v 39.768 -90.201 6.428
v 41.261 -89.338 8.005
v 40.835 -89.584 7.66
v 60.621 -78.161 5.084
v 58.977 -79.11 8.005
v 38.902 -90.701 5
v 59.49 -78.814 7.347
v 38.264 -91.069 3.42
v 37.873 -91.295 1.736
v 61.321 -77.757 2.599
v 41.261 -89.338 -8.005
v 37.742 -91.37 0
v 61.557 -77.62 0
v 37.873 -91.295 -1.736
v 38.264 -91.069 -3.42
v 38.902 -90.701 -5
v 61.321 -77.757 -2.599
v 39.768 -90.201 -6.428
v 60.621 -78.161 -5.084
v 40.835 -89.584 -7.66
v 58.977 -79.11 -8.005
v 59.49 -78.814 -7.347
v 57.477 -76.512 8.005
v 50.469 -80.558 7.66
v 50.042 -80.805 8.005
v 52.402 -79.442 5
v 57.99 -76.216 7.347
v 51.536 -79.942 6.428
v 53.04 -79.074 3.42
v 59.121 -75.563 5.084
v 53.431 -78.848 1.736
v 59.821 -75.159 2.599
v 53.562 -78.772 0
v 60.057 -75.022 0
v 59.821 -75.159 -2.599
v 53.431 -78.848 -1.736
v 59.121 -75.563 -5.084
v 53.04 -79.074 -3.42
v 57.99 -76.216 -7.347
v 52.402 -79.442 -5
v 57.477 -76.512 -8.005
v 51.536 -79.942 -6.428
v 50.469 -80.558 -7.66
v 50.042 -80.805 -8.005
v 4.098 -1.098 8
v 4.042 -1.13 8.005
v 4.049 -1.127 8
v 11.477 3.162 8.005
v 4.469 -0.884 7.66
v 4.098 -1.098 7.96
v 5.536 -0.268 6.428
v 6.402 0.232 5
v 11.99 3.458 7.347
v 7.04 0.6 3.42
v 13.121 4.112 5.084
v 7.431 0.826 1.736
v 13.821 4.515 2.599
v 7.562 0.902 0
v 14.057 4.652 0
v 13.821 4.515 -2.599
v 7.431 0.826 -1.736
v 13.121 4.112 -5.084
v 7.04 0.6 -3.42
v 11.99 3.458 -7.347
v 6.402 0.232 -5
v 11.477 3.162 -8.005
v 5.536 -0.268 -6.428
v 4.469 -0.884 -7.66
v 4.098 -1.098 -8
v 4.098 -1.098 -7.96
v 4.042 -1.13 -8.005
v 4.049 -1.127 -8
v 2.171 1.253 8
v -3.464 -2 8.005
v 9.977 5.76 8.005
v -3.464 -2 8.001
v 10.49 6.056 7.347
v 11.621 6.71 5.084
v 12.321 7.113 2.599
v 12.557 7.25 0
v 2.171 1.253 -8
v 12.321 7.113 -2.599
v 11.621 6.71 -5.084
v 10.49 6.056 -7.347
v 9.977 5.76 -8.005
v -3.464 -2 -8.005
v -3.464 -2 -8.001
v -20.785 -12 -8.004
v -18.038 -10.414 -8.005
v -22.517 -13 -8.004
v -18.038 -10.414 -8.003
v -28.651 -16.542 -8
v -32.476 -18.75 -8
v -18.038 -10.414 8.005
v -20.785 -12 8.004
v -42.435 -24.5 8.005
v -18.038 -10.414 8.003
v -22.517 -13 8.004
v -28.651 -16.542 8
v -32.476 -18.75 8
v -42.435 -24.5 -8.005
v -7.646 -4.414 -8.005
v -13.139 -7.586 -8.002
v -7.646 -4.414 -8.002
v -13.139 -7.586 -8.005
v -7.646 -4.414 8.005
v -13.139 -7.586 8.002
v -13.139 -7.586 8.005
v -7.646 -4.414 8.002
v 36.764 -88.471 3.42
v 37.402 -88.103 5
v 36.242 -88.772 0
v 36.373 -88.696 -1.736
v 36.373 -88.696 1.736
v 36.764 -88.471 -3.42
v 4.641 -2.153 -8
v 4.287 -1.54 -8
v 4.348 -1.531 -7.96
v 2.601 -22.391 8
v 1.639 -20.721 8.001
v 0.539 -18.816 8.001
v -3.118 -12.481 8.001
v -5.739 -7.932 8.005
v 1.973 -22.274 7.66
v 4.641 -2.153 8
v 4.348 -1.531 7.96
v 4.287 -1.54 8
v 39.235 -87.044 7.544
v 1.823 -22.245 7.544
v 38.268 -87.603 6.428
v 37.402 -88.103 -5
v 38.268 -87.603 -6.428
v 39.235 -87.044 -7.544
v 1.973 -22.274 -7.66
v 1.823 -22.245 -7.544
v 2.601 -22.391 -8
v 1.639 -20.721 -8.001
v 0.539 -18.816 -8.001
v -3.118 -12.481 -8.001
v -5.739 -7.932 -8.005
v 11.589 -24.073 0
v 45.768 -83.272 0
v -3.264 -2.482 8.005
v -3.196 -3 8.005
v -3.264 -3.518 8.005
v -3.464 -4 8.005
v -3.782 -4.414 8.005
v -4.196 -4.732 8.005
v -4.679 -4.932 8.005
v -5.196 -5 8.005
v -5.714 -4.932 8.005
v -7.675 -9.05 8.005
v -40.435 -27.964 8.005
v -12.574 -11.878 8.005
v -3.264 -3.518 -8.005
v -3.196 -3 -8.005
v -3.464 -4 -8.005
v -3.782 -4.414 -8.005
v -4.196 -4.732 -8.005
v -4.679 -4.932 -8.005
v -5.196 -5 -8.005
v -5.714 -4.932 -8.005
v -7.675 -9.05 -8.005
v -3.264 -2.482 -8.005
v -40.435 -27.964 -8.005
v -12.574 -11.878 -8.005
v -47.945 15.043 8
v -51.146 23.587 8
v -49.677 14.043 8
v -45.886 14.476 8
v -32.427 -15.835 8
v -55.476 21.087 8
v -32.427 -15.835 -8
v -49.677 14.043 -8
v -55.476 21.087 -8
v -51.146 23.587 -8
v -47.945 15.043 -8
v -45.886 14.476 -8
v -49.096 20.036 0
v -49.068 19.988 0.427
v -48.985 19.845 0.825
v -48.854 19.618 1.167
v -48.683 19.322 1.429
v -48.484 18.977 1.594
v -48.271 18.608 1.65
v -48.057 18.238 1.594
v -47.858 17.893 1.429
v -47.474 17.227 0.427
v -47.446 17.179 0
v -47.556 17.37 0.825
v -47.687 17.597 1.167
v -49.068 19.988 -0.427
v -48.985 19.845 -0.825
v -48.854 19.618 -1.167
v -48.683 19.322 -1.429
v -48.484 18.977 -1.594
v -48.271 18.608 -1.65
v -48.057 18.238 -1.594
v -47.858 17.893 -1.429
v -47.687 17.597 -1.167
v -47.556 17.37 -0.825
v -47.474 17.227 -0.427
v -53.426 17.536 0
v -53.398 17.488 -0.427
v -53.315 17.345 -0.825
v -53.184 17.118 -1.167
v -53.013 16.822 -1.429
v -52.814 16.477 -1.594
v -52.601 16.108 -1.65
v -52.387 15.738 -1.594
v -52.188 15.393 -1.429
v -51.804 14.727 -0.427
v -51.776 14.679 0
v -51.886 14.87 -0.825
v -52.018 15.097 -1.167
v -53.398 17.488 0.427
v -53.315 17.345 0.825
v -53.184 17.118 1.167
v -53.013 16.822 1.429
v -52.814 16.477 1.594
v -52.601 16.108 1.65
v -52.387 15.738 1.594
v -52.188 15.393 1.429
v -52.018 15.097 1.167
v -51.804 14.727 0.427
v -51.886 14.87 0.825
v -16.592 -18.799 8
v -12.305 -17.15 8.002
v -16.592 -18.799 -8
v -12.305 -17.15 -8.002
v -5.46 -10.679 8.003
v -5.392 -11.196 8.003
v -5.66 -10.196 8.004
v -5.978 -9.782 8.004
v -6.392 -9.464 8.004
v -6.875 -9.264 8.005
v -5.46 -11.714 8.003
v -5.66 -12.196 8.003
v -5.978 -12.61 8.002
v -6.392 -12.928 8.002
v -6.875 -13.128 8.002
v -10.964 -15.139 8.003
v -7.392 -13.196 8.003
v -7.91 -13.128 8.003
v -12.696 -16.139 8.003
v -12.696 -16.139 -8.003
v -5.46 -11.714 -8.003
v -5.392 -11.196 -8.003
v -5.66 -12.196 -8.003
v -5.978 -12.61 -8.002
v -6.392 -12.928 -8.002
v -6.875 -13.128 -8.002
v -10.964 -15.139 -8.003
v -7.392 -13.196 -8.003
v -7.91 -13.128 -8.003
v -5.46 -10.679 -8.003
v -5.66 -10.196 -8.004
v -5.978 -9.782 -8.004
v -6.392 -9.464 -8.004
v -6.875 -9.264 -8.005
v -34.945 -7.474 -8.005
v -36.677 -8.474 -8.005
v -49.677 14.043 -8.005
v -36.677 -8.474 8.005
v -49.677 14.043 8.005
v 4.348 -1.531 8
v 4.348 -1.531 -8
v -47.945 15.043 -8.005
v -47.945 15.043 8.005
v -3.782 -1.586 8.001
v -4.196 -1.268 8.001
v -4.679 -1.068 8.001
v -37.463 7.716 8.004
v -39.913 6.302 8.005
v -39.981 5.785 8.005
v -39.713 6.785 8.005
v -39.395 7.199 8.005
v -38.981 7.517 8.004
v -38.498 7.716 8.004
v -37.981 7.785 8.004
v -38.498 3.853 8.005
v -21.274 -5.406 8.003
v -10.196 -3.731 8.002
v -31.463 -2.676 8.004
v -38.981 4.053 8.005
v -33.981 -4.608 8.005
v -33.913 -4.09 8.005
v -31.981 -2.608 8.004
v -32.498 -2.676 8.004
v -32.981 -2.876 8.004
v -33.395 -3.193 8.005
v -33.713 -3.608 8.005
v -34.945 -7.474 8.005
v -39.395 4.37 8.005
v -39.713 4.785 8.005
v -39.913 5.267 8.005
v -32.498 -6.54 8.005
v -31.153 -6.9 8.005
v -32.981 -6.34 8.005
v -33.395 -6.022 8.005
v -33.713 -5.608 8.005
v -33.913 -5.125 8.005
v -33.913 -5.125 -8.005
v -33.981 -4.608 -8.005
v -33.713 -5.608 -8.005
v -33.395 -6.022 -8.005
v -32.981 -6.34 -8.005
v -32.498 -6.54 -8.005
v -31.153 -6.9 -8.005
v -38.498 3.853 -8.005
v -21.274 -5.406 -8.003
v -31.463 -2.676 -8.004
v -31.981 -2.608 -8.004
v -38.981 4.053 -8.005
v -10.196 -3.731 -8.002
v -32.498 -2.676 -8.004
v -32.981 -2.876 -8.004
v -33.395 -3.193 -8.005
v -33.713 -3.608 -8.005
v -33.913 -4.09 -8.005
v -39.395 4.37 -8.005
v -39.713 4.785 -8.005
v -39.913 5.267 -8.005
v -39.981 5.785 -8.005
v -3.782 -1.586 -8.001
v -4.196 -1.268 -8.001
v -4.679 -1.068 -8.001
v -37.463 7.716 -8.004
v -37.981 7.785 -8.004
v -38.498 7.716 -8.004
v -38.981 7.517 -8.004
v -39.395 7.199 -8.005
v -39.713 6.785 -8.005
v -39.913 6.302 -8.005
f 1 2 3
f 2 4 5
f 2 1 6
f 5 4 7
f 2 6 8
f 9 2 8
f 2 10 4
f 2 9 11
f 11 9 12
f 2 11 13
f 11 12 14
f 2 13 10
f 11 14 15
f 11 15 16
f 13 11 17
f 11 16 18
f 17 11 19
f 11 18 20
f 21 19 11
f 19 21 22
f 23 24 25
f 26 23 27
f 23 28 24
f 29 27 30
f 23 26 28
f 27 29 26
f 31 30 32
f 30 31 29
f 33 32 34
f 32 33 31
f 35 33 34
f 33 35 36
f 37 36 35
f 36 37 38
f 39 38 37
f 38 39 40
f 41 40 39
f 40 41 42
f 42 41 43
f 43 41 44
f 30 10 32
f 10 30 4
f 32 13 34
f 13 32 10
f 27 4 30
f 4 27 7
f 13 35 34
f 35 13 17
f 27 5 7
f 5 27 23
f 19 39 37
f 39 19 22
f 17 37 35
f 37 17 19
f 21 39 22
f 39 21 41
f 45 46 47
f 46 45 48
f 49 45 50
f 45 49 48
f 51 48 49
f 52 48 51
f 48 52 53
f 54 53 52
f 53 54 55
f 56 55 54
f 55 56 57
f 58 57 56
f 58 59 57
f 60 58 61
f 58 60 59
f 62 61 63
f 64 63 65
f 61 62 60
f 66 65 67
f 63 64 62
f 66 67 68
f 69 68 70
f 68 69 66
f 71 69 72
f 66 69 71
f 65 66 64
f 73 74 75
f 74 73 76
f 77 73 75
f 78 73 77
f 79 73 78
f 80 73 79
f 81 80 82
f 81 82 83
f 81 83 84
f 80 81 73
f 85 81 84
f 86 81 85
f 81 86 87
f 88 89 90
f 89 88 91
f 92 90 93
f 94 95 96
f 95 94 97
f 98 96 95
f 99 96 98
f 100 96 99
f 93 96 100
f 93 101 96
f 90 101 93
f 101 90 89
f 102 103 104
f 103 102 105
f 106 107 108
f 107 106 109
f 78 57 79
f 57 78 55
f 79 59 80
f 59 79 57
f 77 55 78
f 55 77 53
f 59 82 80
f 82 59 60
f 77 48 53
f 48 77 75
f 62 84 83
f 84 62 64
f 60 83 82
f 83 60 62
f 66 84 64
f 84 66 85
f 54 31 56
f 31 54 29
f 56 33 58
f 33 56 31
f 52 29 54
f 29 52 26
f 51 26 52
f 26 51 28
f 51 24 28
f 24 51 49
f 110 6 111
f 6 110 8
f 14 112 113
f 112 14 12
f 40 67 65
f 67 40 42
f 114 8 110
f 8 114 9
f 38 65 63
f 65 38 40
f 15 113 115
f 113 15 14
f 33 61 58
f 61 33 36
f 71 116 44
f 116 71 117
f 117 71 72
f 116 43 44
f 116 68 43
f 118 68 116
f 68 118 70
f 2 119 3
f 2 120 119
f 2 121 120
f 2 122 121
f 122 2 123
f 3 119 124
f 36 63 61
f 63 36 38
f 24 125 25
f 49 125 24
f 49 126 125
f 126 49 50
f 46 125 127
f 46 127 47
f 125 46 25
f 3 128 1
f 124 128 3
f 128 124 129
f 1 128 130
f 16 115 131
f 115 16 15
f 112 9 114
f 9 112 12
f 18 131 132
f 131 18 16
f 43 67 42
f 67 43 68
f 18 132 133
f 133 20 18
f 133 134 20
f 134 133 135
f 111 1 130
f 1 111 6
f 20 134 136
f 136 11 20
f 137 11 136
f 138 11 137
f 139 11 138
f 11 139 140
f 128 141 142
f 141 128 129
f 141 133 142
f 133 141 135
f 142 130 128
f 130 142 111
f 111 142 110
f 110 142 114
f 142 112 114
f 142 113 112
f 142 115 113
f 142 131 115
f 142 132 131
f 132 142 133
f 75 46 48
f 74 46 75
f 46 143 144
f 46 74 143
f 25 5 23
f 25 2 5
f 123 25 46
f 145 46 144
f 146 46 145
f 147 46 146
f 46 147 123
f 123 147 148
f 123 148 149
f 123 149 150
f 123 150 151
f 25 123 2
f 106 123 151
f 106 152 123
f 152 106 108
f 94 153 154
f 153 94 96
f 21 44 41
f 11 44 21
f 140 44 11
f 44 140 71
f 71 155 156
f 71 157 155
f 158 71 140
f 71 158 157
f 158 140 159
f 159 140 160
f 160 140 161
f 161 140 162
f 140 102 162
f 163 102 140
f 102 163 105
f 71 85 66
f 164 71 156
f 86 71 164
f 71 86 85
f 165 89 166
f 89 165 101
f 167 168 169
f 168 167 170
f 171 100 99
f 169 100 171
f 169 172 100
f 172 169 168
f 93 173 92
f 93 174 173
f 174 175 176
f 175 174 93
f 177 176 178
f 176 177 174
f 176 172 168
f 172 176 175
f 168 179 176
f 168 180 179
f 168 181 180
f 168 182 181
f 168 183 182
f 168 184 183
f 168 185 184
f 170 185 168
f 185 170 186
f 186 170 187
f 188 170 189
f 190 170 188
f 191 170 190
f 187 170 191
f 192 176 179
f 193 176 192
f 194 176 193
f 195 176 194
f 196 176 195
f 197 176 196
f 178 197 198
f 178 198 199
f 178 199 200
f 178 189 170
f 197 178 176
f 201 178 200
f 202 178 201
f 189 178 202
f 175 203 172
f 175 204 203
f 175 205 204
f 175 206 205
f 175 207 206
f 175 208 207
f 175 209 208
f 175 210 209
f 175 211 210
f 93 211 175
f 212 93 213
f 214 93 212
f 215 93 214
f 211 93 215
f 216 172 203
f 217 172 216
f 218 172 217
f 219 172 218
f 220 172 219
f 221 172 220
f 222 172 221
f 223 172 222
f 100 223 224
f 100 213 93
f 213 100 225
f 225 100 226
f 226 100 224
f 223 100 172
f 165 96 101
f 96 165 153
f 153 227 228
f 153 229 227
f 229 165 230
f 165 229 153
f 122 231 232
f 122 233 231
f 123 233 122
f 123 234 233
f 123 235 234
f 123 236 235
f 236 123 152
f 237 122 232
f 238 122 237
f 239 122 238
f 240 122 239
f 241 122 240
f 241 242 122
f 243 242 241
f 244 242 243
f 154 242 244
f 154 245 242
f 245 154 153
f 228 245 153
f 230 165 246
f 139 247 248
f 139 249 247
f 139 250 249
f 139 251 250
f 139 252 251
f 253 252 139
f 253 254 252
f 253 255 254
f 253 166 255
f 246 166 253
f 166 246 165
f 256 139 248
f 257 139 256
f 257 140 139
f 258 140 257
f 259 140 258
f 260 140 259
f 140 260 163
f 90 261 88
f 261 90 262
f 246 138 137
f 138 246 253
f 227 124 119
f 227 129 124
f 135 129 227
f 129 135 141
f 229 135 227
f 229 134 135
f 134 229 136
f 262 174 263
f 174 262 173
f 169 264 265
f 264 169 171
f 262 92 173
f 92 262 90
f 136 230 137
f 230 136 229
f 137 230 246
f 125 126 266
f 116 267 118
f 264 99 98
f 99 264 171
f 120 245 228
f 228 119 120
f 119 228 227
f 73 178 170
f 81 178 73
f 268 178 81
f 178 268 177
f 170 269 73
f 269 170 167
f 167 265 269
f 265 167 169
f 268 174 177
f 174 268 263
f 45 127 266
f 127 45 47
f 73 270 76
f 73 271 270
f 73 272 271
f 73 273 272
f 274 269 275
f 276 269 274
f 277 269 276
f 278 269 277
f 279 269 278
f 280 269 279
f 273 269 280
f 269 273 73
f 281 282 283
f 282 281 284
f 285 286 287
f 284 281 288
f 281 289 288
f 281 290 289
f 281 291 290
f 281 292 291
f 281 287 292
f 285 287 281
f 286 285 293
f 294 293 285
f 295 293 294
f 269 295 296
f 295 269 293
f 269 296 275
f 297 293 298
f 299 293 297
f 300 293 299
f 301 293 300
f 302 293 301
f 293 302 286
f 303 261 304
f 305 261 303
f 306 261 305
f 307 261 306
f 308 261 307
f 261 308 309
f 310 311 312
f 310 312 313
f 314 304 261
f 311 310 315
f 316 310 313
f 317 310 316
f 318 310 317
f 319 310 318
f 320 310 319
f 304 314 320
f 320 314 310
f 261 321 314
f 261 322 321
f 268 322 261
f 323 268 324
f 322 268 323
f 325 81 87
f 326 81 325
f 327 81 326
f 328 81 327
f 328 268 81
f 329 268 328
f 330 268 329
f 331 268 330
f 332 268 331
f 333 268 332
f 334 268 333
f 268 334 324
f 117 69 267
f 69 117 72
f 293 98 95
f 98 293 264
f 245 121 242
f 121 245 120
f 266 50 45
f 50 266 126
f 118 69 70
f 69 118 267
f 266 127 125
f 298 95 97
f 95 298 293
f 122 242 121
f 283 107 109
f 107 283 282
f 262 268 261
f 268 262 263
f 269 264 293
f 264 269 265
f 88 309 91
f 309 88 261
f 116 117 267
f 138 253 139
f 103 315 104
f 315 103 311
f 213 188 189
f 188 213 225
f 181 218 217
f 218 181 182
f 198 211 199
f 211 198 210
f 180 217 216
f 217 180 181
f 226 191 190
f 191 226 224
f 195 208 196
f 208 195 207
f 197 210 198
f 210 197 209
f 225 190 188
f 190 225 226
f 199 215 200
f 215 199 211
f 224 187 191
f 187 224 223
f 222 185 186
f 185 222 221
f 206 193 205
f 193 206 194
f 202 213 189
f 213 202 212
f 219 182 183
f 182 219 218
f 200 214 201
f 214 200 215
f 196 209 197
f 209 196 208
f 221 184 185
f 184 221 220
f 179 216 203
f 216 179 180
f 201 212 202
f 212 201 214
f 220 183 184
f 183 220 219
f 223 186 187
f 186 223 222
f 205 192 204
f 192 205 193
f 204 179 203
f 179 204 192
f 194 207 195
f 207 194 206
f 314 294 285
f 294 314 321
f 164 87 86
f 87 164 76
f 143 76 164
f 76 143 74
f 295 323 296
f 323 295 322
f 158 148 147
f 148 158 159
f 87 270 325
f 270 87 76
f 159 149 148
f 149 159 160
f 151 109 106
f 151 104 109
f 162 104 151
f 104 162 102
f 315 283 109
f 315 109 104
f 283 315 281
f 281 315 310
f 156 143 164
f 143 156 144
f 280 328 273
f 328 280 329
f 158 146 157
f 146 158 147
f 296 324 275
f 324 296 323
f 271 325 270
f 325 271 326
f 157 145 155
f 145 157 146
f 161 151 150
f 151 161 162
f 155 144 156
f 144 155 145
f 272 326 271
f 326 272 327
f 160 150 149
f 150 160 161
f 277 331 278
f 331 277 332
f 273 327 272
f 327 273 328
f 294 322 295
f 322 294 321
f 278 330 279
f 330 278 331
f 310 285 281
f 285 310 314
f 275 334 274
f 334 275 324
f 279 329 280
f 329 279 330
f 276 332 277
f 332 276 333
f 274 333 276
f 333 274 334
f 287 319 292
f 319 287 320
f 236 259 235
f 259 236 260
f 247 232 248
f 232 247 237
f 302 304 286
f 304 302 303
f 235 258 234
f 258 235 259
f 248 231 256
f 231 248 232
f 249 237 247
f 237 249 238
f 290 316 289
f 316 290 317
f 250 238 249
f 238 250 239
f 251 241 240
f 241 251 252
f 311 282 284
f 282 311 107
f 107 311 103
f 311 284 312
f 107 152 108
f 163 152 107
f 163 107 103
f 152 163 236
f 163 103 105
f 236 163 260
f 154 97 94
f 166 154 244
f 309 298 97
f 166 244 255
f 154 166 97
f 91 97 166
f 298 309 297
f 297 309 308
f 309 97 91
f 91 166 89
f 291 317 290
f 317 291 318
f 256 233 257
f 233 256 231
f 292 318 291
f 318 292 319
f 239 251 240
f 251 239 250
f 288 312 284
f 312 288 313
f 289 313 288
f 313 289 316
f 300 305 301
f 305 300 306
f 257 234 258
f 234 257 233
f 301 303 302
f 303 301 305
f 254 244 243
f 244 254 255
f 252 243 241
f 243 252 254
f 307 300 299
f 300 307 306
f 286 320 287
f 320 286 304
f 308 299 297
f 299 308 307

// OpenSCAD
// thickness of the holder (z height)
height = 16;

// how far to raise the holder (20-100)
raiser = 35;

// base mount thickness (you need to 16 to this to get the M3 screw needed - ie, thickess of 9mm would need a M3d 25mm)
base_thickness = 5;

// end caps
cap_size = 25;

// length of the holder (thickness of the spool)
length = 92;

/* [Hidden] */

len = length + 6;

epsilon = 0.01;

module printrbot_holder()
{    
    difference() {
    
        union() {
        intersection() {
            difference() {    
                union() {
            
                    // spool support
                    translate([len/2, -6, 0])
                        cube([len, 2*cap_size, height+epsilon], center=true);

                }
            }

            difference()
            {
                union() {
                    rotate([90,0,90])
                    {
                        // round the support
                        translate([-3.0, 0, len/2 -cap_size/2])
                            cylinder(r=height/2 + 2, h=2*len, center=true , $fn=36);

                        
                        // far end stop
                        translate([2, 0, len - 3/2]) {
                            intersection() {
                                cube([cap_size,cap_size,3], center=true);
                                cylinder(r=cap_size*0.5, h=3, center=true);
                            }
                        }
                        
                        // base end stop
                        translate([2, 0, 3/2]) {
                            intersection() {
                                cube([cap_size,cap_size,3], center=true);
                                cylinder(r=cap_size*0.5, h=3, center=true);
                            }
                        }

                    }
                } // union
                    
                rotate([90,0,90])
                    translate([-10, 0, len/2])
                    cylinder(r=height/2, h=len - 3 - 3 , center=true , $fn=4);
            }
        }
        
        
        difference()
        {
            union() {
                
                // attach lip
                translate([-46/2, -raiser,0])
                    cube([46, base_thickness, height], center=true);
                
                // raiser
                hull() {
                    translate([2,-(raiser+14)/2,0])
                        cube([4, (raiser+14), height+epsilon], center=true);

                    translate([10,0,0])
                    rotate([90,0,90])
                        intersection() {
                            cube([3, height, 3], center=true);
                                cylinder(r=cap_size*0.5, h=3, center=true);
                        }
                    
                }

                hull() {
                    translate([-12,-raiser,0])
                        cube([2, 2, height+epsilon], center=true);

                    translate([26,0,0])
                    rotate([90,0,90])
                        intersection() {
                            cube([2, height, 3], center=true);
                                cylinder(r=cap_size*0.5, h=3, center=true);
                        }
                 
                    translate([-36,-raiser,0])
                        cube([2, 2, height+epsilon], center=true);

        
                    translate([2,2,0])
                    rotate([90,0,90])
                        intersection() {
                            cube([2, height, 3], center=true);
                                cylinder(r=cap_size*0.5, h=3, center=true);
                        }
                        
                    
                    // bottom    
                    #translate([-4,-raiser,0])
                    rotate([90,0,90])
                        intersection() {
                            cube([2, height, 3], center=true);
                                cylinder(r=cap_size*0.5, h=3, center=true);
                        }
                        

                }
                
            }
            
            
            // attach screw
            translate([-40.25,-30,0])
                rotate([90,0,0])
                cylinder(r=3.3/2, h=20, $fn=24, center=true);
            
        }
    }
    
        hull() {
            translate([-24,-raiser + 5,0])
                cylinder(r=2, h=height+epsilon, $fn=24, center=true);

            translate([0,-6,0])
                cylinder(r=2, h=height+2*epsilon, $fn=24, center=true);
        }

        hull() {
            translate([-12,-raiser + 5,0])
                cylinder(r=2, h=height+epsilon, $fn=24, center=true);

            translate([12 - 6,-6 - 6,0])
                cylinder(r=2, h=height+2*epsilon, $fn=24, center=true);
        }
        
    }

}


rotate([0,0,-60])
    printrbot_holder();
